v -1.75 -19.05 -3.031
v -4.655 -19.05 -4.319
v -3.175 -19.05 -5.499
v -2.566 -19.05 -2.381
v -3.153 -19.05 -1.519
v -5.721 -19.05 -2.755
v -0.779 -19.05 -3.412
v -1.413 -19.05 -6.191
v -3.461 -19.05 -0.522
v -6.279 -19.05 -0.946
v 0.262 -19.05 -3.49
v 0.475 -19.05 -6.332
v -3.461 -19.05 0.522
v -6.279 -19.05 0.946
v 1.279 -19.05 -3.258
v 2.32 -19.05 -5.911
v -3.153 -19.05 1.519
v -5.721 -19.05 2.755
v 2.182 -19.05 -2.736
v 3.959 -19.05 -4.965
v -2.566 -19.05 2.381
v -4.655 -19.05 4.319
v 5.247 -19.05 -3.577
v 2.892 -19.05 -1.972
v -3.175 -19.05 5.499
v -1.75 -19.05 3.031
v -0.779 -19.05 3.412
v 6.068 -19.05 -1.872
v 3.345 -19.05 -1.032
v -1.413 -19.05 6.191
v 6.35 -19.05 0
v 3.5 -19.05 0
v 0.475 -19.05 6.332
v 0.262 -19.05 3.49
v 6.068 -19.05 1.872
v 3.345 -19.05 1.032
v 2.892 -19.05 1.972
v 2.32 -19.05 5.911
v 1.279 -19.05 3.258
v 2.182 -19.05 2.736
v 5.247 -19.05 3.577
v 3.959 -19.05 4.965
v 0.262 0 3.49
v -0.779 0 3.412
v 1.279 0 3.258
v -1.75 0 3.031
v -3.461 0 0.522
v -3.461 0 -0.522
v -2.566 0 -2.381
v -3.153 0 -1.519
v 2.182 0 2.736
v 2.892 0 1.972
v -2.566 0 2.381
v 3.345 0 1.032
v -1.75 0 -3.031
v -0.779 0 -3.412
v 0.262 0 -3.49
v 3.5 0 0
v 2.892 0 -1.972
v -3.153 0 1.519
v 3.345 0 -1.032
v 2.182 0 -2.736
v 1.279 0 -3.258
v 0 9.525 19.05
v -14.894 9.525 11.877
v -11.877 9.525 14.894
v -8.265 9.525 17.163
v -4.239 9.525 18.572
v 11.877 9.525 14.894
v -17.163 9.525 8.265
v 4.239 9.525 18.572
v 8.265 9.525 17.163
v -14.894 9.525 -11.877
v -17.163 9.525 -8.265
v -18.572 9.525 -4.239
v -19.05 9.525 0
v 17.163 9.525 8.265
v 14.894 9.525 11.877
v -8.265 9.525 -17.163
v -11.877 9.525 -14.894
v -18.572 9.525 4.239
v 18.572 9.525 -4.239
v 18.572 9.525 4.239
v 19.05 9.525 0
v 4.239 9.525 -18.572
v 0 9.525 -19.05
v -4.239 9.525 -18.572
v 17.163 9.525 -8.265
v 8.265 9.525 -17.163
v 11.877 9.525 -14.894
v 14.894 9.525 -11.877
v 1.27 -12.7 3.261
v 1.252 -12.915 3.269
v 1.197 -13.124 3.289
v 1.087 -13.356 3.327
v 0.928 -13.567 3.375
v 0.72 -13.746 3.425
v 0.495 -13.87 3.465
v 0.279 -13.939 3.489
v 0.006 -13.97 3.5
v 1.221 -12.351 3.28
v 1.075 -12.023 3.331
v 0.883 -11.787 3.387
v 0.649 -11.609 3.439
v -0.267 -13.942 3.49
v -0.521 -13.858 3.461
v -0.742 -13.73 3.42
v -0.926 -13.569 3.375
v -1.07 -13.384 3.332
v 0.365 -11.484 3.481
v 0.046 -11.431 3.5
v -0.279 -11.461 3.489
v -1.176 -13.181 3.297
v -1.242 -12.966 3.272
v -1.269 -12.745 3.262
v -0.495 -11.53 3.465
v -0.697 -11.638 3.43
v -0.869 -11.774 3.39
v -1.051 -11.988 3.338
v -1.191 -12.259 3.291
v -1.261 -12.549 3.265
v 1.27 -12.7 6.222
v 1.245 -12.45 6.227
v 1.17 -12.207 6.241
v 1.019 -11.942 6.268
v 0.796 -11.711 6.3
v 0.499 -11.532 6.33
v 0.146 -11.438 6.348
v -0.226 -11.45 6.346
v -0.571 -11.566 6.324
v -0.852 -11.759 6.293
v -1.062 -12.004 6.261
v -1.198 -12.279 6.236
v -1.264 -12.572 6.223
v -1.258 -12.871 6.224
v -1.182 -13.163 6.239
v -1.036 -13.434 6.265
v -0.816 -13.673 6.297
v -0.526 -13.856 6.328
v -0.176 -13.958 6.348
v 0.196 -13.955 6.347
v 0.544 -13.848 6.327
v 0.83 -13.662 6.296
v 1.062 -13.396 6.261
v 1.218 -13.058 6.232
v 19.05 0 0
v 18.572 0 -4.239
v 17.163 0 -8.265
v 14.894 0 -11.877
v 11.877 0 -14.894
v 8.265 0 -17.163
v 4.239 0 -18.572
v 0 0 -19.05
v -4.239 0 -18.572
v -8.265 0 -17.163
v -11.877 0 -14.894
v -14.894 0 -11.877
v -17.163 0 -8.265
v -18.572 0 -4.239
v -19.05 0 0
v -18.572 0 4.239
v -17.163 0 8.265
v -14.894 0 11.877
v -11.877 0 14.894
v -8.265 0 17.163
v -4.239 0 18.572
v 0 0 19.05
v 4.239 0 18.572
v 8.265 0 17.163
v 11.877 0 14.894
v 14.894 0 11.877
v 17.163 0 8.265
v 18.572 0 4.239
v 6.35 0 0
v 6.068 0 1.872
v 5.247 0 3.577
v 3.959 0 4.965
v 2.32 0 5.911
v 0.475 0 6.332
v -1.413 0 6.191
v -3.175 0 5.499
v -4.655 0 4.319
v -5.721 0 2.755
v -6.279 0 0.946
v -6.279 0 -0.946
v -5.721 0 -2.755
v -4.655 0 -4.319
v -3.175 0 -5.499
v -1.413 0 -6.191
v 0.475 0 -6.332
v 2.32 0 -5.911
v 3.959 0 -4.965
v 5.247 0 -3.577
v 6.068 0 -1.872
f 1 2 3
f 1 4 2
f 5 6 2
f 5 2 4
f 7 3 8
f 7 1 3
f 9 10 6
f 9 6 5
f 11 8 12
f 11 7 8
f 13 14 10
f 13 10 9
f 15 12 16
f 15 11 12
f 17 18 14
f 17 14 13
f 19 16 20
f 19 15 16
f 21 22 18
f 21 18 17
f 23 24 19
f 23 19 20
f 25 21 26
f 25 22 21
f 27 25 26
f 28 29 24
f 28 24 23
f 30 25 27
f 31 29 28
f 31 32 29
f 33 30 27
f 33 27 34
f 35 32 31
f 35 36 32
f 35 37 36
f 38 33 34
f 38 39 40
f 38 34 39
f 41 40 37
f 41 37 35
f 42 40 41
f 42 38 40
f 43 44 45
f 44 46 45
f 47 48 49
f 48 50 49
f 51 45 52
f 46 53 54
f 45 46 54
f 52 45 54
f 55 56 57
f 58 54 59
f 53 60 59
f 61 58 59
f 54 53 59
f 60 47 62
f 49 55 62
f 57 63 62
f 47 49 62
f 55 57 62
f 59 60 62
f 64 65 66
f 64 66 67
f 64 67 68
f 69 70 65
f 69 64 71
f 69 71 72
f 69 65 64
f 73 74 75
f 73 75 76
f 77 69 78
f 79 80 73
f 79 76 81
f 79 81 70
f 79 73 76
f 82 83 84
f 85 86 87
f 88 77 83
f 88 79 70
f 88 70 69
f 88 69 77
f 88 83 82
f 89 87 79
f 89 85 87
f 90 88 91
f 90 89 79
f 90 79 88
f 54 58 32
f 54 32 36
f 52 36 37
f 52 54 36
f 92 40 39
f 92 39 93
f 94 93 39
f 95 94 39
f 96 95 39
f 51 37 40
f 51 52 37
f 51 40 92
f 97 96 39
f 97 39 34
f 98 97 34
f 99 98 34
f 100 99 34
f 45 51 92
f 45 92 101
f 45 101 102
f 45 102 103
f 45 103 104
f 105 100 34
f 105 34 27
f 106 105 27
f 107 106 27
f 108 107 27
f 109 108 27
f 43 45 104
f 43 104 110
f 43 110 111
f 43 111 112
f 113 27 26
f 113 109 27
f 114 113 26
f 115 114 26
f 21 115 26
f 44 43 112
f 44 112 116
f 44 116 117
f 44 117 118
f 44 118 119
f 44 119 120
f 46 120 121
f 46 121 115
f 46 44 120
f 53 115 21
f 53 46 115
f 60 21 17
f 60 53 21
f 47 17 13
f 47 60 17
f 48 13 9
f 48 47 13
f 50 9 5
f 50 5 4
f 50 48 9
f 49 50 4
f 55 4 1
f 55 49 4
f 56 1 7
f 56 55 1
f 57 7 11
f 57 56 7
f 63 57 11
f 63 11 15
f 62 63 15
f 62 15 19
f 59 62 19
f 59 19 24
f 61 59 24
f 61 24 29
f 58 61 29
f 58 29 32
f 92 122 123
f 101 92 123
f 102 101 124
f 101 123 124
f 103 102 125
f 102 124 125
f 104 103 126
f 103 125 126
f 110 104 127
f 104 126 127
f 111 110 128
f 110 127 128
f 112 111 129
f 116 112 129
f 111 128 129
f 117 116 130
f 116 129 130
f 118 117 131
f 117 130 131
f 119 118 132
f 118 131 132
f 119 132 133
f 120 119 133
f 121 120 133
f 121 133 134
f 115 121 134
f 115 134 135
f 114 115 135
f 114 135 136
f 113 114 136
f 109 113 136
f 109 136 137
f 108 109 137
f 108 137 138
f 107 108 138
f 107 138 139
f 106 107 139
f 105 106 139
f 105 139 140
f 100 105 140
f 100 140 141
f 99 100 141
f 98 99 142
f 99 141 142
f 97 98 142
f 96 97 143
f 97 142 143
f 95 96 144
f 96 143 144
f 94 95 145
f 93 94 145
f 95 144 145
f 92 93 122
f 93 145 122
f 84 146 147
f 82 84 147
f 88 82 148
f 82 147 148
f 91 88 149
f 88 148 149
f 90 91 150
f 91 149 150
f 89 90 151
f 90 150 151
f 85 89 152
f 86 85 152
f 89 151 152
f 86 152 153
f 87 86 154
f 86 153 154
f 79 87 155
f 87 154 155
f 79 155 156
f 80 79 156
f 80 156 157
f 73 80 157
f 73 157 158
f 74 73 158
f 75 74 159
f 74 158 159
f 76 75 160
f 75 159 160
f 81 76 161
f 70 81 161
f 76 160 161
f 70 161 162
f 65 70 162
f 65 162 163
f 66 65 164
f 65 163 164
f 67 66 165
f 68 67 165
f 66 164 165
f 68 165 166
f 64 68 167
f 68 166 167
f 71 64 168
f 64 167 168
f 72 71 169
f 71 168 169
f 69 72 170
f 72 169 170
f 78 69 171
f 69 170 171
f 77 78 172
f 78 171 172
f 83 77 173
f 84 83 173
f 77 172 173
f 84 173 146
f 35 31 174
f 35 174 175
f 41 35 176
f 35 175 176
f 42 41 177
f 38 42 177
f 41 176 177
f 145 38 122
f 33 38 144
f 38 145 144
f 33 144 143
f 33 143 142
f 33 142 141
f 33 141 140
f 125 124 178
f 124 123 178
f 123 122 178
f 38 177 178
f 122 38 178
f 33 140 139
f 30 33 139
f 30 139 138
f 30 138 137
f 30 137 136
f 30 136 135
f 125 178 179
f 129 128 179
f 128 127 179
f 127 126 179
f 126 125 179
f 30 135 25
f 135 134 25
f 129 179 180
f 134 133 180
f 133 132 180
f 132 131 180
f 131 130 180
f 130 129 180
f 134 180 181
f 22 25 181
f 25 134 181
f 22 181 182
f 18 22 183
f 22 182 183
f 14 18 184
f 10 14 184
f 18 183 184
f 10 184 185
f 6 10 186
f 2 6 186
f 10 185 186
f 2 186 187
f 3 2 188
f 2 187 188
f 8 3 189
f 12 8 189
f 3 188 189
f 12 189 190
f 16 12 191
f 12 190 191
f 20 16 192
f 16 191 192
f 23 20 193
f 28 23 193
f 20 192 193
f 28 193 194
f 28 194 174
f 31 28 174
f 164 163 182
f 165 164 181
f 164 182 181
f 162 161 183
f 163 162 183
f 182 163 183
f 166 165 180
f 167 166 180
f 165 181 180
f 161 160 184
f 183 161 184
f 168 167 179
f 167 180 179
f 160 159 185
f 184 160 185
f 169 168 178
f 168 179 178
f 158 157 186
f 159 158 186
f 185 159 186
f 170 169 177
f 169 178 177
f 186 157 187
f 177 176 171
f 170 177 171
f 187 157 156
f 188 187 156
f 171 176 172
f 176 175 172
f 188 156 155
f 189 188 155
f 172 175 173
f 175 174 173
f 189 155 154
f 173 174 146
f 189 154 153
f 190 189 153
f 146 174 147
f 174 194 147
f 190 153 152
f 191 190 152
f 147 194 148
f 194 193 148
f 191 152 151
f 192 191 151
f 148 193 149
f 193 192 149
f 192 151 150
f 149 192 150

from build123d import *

# Parameters (mm, degrees)
SKETCH1_R           = 19.05
BOSS_EXTRUDE1_DEPTH = 9.525
SKETCH2_R           = 6.35
SKETCH2_R_2         = 3.5
BOSS_EXTRUDE2_DEPTH = 19.05
CUT_EXTRUDE1_REACH  = 27.4
SKETCH3_R           = 1.27


with BuildPart() as part:
    # Sketch1 → Boss-Extrude1 (new body)
    with BuildSketch(Plane(origin=(0, 0, 0), x_dir=(1, 0, 0), z_dir=(0, 1, 0))):
        Circle(SKETCH1_R)
    extrude(amount=BOSS_EXTRUDE1_DEPTH)

    # Sketch2 → Boss-Extrude2 (add)
    with BuildSketch(Plane.XZ):
        Circle(SKETCH2_R)
        Circle(SKETCH2_R_2, mode=Mode.SUBTRACT)
    extrude(amount=BOSS_EXTRUDE2_DEPTH)

    # Sketch3 → Cut-Extrude1 (cut, up to next)
    with BuildSketch(Plane.XY.offset(6.35), mode=Mode.PRIVATE) as cut_extrude1_sk1:
        with Locations((0, -12.7)):
            Circle(SKETCH3_R)
    cut_extrude1_tool1 = extrude(cut_extrude1_sk1.sketch, amount=-CUT_EXTRUDE1_REACH, mode=Mode.PRIVATE) & part.part
    add(cut_extrude1_tool1.solids().sort_by_distance((0, -12.7, 6.35))[0], mode=Mode.SUBTRACT)


solid = part.part
